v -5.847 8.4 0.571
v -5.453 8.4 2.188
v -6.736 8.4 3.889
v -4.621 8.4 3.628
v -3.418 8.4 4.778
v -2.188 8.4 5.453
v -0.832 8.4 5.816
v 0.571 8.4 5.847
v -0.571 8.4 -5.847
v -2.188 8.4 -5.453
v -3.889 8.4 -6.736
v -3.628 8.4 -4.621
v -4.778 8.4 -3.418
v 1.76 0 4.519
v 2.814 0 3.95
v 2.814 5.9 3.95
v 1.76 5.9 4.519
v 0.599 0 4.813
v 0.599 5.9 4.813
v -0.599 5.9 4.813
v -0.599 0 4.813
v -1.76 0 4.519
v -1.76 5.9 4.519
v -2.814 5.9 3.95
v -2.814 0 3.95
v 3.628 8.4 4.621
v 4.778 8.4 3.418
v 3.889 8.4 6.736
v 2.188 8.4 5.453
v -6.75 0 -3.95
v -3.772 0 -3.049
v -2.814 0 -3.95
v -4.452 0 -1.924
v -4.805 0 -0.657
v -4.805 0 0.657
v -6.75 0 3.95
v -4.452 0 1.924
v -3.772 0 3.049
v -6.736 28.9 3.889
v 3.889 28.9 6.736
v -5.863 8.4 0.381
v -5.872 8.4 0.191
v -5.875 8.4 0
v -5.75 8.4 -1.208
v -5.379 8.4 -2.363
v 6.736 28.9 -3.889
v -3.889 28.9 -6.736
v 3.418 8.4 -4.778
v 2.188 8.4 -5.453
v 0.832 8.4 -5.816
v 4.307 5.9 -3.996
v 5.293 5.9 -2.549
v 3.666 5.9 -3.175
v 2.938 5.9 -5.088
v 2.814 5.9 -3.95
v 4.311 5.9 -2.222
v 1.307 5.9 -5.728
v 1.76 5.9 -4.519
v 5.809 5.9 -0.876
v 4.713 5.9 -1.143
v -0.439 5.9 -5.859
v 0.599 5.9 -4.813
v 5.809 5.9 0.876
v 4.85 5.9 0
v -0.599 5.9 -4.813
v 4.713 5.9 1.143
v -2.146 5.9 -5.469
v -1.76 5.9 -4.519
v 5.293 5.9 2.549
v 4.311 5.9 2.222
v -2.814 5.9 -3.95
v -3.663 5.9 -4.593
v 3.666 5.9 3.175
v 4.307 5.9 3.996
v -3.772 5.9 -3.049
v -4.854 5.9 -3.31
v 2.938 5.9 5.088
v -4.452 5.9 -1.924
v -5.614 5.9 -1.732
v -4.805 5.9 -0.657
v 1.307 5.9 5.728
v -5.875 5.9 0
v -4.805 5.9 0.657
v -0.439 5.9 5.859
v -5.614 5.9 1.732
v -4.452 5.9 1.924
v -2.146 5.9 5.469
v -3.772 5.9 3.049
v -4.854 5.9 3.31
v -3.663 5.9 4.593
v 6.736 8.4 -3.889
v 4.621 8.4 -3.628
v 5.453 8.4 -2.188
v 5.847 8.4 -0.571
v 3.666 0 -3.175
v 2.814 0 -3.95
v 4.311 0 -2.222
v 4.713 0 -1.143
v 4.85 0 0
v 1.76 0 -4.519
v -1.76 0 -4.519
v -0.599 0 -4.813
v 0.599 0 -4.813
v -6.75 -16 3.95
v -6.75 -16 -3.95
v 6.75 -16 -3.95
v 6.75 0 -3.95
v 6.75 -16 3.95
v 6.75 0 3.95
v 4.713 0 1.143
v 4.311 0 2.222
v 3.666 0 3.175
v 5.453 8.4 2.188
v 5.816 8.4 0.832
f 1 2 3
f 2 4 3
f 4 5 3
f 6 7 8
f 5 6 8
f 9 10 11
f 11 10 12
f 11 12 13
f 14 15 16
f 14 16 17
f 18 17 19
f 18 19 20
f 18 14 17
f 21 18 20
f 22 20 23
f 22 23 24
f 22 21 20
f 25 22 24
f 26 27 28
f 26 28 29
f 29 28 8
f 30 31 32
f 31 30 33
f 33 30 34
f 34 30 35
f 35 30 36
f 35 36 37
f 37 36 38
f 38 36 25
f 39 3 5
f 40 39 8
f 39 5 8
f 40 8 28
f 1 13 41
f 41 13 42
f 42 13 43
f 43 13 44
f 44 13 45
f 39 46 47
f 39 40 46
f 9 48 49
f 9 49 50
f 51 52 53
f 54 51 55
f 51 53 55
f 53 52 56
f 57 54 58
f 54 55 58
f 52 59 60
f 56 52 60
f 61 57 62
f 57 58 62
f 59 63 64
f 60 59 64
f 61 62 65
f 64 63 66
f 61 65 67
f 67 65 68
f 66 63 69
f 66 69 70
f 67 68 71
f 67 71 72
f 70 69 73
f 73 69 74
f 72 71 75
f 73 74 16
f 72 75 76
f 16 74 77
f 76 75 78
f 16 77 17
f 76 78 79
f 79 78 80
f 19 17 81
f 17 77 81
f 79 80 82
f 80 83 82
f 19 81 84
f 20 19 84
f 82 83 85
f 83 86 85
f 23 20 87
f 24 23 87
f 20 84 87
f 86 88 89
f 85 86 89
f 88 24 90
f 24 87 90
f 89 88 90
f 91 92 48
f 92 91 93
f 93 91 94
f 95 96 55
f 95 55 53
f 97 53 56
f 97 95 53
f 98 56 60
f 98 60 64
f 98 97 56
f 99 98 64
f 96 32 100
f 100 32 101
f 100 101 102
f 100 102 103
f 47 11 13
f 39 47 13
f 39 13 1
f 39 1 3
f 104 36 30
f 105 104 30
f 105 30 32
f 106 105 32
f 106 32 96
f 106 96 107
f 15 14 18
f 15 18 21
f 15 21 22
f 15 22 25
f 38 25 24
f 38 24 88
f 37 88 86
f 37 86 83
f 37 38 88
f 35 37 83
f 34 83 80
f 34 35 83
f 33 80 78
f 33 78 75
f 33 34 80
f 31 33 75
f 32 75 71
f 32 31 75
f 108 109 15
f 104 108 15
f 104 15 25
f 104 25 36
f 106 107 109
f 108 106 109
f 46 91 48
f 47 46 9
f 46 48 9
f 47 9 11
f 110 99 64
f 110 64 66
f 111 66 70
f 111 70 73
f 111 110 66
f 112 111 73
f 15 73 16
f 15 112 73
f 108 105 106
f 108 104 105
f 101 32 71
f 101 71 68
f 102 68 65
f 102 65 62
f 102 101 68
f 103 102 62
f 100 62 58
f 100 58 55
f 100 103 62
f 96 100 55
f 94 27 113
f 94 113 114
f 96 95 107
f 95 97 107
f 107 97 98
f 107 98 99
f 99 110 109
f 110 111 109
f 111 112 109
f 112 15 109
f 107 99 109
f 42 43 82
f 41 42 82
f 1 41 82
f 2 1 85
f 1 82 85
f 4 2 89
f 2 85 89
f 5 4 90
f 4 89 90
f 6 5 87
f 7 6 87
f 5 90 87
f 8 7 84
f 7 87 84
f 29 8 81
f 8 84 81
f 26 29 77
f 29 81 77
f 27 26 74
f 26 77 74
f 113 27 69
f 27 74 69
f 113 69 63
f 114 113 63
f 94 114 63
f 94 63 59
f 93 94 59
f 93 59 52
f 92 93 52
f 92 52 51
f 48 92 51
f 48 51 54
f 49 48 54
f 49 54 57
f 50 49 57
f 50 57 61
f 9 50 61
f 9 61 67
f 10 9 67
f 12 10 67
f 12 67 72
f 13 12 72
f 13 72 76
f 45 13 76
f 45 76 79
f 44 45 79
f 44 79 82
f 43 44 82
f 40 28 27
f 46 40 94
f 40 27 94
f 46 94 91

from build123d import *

# Parameters (mm, degrees)
F1_DEPTH = 5.9
F2_DEPTH = 16
F3_R     = 5.875
F3_R_2   = 4.85
F4_DEPTH = 2.5
F6_DEPTH = 20.5


with BuildPart() as f1:
    # F0 (on Front) → F1 (new body)
    with BuildSketch(Plane.XZ):
        with BuildLine():
            Line((-2.8142494559, -3.95), (2.8142494559, -3.95))
            ThreePointArc((2.8142494559, -3.95), (4.311125715, -2.2218674734), (4.85, 0))
            ThreePointArc((4.85, 0), (4.311125715, 2.2218674734), (2.8142494559, 3.95))
            Line((2.8142494559, 3.95), (-2.8142494559, 3.95))
            ThreePointArc((-2.8142494559, 3.95), (-4.85, 0), (-2.8142494559, -3.95))
        make_face()
        with BuildLine():
            ThreePointArc((-2.8142494559, -3.95), (0, -4.85), (2.8142494559, -3.95))
            Line((2.8142494559, -3.95), (-2.8142494559, -3.95))
        make_face()
        with BuildLine():
            Line((-2.8142494559, 3.95), (2.8142494559, 3.95))
            ThreePointArc((2.8142494559, 3.95), (0, 4.85), (-2.8142494559, 3.95))
        make_face()
    extrude(amount=-F1_DEPTH)

    # F0 (on Front) → F2 (join)
    with BuildSketch(Plane.XZ):
        with BuildLine():
            Line((-6.75, -3.95), (-2.8142494559, -3.95))
            ThreePointArc((-2.8142494559, -3.95), (-4.85, 0), (-2.8142494559, 3.95))
            Line((-2.8142494559, 3.95), (-6.75, 3.95))
            Line((-6.75, 3.95), (-6.75, -3.95))
        make_face()
        with BuildLine():
            Line((-2.8142494559, -3.95), (2.8142494559, -3.95))
            ThreePointArc((2.8142494559, -3.95), (4.311125715, -2.2218674734), (4.85, 0))
            ThreePointArc((4.85, 0), (4.311125715, 2.2218674734), (2.8142494559, 3.95))
            Line((2.8142494559, 3.95), (-2.8142494559, 3.95))
            ThreePointArc((-2.8142494559, 3.95), (-4.85, 0), (-2.8142494559, -3.95))
        make_face()
        with BuildLine():
            Line((2.8142494559, -3.95), (6.75, -3.95))
            Line((6.75, -3.95), (6.75, 3.95))
            Line((6.75, 3.95), (2.8142494559, 3.95))
            ThreePointArc((2.8142494559, 3.95), (4.311125715, 2.2218674734), (4.85, 0))
            ThreePointArc((4.85, 0), (4.311125715, -2.2218674734), (2.8142494559, -3.95))
        make_face()
    extrude(amount=F2_DEPTH)

    # F3 (on face) → F4 (join)
    with BuildSketch(Plane(origin=(0, 5.9, 0), x_dir=(-1, 0, 0), z_dir=(0, 1, 0))):
        Circle(F3_R)
        Circle(F3_R_2, mode=Mode.SUBTRACT)
        Circle(F3_R_2)
    extrude(amount=F4_DEPTH)

    # F5 (on face) → F6 (join)
    with BuildSketch(Plane(origin=(0, 8.4, 0), x_dir=(-1, 0, 0), z_dir=(0, 1, 0))):
        Polygon((-6.7360967927, -3.8890872965), (3.8890872965, -6.7360967927), (6.7360967927, 3.8890872965), (-3.8890872965, 6.7360967927), align=None)
    extrude(amount=F6_DEPTH)


solid = f1.part
